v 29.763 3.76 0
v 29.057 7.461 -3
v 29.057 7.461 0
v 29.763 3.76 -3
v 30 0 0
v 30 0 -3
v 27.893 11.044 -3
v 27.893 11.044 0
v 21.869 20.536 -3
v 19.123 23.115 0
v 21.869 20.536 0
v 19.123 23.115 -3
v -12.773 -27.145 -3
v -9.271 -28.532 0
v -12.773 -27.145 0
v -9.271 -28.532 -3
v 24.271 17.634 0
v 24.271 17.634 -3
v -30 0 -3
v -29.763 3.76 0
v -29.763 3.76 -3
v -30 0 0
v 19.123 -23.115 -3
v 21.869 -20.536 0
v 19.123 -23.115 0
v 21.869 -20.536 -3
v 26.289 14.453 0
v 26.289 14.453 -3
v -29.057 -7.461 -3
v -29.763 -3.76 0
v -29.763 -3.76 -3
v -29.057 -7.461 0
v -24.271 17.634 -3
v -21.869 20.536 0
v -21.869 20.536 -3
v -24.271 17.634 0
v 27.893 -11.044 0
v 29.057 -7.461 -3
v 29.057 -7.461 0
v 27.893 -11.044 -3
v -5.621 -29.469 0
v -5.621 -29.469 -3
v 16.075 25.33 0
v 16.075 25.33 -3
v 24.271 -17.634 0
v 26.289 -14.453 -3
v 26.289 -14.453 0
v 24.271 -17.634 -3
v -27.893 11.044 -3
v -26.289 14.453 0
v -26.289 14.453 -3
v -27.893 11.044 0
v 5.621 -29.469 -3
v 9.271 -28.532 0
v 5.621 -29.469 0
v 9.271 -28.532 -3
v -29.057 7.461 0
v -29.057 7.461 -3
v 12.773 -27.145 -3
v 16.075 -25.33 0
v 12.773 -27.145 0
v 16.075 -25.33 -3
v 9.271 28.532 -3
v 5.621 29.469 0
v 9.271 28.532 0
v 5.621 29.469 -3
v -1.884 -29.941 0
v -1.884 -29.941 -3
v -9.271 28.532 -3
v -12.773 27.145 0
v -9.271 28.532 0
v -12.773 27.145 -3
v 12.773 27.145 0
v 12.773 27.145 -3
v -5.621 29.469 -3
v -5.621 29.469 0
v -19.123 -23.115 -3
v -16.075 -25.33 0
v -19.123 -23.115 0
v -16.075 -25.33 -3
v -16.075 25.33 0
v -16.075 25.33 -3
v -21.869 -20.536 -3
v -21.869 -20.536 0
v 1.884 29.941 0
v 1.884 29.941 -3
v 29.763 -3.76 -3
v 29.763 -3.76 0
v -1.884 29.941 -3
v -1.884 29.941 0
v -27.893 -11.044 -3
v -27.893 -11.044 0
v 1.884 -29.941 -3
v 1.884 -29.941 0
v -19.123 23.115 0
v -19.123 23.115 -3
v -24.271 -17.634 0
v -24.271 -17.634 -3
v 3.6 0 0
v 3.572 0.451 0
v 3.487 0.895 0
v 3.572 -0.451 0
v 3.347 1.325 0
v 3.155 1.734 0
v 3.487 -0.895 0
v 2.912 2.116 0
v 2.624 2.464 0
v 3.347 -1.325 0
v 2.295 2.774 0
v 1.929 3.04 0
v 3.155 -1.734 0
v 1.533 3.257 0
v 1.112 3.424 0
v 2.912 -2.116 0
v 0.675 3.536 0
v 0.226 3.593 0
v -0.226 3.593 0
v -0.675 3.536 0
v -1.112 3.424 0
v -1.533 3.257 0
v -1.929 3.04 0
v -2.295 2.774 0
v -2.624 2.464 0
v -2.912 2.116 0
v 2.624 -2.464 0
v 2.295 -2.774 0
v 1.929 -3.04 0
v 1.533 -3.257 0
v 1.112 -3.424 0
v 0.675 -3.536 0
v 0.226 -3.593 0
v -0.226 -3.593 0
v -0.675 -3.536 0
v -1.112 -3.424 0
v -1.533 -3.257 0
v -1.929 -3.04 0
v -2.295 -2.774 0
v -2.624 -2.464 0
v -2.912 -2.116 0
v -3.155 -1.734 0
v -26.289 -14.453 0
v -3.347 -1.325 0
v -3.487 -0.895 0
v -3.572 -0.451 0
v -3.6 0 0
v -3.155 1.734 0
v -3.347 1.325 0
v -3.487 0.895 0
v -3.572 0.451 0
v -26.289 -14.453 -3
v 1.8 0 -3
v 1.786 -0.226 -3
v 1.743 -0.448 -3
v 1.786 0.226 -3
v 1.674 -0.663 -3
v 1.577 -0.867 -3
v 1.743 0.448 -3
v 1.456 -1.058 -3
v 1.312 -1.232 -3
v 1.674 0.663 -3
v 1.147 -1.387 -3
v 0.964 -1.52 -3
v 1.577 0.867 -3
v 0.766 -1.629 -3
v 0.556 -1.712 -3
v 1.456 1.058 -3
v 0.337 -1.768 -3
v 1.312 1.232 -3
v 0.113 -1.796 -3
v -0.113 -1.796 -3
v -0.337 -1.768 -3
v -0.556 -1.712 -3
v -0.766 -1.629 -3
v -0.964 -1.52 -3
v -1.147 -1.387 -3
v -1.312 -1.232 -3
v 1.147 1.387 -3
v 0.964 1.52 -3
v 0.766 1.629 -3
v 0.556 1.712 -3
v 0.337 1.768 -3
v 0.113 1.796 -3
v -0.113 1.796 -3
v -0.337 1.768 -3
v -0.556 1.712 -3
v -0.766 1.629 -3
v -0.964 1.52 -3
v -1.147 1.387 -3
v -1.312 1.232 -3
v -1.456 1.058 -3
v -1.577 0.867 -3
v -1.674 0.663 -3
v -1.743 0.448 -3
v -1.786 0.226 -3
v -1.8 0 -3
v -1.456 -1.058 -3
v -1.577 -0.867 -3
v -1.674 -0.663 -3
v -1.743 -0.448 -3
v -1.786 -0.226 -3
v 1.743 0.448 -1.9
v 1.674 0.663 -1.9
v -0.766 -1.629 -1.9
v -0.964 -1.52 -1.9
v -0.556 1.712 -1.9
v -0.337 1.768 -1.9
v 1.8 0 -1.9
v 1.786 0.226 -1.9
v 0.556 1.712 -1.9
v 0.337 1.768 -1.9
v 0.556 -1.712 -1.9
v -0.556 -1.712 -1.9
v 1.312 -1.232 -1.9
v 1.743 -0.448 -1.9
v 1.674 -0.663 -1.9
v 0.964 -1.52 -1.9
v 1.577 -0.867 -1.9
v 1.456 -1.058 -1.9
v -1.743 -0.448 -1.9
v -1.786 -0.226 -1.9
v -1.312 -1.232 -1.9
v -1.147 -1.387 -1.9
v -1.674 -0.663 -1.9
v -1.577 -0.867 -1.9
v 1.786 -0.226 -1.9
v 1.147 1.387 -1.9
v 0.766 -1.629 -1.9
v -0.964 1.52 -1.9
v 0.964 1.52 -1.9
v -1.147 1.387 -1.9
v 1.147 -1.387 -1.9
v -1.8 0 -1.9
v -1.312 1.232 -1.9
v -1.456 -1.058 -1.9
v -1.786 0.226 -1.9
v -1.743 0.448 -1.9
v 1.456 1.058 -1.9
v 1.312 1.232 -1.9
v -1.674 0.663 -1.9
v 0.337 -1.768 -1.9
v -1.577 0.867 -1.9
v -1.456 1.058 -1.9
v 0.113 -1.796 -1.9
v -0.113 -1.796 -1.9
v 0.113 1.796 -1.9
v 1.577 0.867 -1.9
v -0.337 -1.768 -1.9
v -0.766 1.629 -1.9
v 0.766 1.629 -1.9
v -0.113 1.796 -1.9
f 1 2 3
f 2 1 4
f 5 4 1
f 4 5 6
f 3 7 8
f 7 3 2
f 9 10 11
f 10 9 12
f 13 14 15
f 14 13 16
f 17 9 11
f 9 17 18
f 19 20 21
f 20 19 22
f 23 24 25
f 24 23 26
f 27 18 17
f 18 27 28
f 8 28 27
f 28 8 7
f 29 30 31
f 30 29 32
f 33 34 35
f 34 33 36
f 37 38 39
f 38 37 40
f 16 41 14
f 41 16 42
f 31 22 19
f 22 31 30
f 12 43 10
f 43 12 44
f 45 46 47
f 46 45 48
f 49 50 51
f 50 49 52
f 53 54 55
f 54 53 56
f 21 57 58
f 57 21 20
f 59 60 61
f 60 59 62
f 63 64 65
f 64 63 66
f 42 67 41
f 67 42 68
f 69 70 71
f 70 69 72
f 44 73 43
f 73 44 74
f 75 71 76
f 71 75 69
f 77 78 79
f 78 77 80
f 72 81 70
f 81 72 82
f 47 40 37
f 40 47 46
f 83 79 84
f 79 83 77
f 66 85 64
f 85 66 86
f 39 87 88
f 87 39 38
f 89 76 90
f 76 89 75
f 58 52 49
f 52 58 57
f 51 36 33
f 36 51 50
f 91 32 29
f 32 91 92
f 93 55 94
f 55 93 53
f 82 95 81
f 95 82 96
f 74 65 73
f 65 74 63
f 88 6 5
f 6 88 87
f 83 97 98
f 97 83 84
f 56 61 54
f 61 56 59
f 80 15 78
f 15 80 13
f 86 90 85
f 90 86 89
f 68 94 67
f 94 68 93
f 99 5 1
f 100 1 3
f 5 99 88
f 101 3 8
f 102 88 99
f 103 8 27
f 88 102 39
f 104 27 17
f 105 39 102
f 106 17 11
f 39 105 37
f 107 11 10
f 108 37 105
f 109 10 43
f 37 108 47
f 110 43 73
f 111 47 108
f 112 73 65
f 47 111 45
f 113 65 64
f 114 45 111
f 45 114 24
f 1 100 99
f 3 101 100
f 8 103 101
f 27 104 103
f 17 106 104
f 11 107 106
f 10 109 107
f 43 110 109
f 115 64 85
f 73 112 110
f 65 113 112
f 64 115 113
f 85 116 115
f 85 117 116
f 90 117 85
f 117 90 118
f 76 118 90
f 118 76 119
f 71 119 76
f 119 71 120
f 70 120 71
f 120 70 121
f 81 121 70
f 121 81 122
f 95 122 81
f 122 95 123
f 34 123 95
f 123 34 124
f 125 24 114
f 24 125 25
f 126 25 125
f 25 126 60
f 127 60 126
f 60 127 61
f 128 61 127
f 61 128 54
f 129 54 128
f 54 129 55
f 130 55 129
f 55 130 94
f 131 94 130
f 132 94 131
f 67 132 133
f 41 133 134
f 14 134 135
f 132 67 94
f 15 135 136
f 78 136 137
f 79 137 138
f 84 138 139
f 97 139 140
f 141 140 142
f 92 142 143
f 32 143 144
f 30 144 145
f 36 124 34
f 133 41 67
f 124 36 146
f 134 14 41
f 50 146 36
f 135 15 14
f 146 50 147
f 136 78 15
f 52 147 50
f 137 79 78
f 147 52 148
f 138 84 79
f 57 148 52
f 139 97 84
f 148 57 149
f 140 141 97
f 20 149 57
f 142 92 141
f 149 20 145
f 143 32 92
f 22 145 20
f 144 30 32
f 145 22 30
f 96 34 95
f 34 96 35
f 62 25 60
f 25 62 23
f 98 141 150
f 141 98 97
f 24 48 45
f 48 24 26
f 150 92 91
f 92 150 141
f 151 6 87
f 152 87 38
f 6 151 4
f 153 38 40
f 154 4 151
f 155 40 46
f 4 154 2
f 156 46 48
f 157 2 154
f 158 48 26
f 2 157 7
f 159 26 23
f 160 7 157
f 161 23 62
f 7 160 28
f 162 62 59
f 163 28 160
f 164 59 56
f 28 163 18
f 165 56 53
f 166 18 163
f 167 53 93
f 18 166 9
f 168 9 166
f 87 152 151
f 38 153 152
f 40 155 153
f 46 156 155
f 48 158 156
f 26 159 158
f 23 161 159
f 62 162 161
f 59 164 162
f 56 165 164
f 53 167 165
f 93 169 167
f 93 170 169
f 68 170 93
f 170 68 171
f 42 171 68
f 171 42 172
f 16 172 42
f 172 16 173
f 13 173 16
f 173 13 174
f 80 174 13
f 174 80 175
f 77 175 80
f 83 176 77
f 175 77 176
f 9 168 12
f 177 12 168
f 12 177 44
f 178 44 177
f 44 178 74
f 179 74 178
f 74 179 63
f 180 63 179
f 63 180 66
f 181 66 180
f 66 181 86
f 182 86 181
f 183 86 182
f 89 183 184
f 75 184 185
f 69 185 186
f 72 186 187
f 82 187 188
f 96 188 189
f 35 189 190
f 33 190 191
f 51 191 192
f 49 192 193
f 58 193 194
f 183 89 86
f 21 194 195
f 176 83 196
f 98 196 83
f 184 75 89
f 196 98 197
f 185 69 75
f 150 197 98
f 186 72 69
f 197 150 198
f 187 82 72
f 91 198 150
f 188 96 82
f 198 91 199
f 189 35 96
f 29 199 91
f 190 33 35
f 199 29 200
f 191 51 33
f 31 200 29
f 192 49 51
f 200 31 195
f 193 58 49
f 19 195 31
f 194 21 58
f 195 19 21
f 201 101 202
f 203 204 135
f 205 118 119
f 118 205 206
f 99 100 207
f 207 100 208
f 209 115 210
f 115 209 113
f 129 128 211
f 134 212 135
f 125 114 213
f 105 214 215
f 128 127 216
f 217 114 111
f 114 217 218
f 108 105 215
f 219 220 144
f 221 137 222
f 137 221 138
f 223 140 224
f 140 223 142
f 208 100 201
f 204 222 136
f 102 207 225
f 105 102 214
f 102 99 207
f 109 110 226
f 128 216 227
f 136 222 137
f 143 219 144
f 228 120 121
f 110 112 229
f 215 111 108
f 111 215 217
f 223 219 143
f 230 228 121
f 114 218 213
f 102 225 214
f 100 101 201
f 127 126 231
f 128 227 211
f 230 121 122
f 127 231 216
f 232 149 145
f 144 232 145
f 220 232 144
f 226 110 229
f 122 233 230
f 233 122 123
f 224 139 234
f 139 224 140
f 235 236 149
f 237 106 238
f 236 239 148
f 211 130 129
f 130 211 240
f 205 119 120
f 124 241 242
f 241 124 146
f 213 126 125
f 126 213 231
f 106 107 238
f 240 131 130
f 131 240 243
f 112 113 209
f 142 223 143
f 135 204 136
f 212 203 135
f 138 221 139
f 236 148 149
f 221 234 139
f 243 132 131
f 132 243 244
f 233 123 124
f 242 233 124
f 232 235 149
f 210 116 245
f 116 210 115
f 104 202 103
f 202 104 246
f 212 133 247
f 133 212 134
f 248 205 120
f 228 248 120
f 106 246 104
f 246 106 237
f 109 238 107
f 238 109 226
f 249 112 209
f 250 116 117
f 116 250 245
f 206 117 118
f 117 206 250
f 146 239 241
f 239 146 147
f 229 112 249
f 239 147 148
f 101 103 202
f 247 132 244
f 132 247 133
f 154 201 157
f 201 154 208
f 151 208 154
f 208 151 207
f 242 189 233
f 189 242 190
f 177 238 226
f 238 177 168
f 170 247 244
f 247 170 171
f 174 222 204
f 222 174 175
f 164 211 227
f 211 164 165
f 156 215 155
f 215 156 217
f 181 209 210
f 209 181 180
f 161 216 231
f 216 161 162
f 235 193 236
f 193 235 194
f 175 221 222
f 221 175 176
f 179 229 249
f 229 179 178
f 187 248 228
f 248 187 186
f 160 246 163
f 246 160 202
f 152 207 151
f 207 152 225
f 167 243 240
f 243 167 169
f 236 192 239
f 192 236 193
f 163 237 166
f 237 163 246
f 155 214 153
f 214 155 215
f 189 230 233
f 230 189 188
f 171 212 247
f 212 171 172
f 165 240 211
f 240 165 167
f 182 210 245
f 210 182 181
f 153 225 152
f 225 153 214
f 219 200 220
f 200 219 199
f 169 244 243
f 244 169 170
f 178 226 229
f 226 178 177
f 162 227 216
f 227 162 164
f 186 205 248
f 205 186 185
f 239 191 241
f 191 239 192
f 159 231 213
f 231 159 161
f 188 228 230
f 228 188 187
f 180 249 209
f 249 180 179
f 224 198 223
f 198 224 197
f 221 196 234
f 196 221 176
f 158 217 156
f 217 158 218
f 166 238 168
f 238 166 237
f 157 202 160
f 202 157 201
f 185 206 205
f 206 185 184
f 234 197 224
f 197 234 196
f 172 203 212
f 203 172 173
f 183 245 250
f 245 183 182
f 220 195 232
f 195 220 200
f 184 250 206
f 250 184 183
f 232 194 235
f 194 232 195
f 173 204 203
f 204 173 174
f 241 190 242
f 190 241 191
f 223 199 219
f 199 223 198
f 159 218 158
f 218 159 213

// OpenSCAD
$fn = 50;


difference() {
	union() {
		translate(v = [0, 0, -3.0000000000]) {
			cylinder(h = 3, r = 30.0000000000);
		}
		translate(v = [0, 0, -3.0000000000]) {
			cylinder(h = 3, r = 2.8750000000);
		}
	}
	union() {
		translate(v = [0, 0, 0]) {
			rotate(a = [0, 0, 0]) {
				difference() {
					union() {
						translate(v = [0, 0, -3.0000000000]) {
							cylinder(h = 3, r = 1.5000000000);
						}
						translate(v = [0, 0, -1.9000000000]) {
							cylinder(h = 1.9000000000, r1 = 1.8000000000, r2 = 3.6000000000);
						}
						translate(v = [0, 0, -3.0000000000]) {
							cylinder(h = 3, r = 1.8000000000);
						}
						translate(v = [0, 0, -3.0000000000]) {
							cylinder(h = 3, r = 1.5000000000);
						}
					}
					union();
				}
			}
		}
	}
}
